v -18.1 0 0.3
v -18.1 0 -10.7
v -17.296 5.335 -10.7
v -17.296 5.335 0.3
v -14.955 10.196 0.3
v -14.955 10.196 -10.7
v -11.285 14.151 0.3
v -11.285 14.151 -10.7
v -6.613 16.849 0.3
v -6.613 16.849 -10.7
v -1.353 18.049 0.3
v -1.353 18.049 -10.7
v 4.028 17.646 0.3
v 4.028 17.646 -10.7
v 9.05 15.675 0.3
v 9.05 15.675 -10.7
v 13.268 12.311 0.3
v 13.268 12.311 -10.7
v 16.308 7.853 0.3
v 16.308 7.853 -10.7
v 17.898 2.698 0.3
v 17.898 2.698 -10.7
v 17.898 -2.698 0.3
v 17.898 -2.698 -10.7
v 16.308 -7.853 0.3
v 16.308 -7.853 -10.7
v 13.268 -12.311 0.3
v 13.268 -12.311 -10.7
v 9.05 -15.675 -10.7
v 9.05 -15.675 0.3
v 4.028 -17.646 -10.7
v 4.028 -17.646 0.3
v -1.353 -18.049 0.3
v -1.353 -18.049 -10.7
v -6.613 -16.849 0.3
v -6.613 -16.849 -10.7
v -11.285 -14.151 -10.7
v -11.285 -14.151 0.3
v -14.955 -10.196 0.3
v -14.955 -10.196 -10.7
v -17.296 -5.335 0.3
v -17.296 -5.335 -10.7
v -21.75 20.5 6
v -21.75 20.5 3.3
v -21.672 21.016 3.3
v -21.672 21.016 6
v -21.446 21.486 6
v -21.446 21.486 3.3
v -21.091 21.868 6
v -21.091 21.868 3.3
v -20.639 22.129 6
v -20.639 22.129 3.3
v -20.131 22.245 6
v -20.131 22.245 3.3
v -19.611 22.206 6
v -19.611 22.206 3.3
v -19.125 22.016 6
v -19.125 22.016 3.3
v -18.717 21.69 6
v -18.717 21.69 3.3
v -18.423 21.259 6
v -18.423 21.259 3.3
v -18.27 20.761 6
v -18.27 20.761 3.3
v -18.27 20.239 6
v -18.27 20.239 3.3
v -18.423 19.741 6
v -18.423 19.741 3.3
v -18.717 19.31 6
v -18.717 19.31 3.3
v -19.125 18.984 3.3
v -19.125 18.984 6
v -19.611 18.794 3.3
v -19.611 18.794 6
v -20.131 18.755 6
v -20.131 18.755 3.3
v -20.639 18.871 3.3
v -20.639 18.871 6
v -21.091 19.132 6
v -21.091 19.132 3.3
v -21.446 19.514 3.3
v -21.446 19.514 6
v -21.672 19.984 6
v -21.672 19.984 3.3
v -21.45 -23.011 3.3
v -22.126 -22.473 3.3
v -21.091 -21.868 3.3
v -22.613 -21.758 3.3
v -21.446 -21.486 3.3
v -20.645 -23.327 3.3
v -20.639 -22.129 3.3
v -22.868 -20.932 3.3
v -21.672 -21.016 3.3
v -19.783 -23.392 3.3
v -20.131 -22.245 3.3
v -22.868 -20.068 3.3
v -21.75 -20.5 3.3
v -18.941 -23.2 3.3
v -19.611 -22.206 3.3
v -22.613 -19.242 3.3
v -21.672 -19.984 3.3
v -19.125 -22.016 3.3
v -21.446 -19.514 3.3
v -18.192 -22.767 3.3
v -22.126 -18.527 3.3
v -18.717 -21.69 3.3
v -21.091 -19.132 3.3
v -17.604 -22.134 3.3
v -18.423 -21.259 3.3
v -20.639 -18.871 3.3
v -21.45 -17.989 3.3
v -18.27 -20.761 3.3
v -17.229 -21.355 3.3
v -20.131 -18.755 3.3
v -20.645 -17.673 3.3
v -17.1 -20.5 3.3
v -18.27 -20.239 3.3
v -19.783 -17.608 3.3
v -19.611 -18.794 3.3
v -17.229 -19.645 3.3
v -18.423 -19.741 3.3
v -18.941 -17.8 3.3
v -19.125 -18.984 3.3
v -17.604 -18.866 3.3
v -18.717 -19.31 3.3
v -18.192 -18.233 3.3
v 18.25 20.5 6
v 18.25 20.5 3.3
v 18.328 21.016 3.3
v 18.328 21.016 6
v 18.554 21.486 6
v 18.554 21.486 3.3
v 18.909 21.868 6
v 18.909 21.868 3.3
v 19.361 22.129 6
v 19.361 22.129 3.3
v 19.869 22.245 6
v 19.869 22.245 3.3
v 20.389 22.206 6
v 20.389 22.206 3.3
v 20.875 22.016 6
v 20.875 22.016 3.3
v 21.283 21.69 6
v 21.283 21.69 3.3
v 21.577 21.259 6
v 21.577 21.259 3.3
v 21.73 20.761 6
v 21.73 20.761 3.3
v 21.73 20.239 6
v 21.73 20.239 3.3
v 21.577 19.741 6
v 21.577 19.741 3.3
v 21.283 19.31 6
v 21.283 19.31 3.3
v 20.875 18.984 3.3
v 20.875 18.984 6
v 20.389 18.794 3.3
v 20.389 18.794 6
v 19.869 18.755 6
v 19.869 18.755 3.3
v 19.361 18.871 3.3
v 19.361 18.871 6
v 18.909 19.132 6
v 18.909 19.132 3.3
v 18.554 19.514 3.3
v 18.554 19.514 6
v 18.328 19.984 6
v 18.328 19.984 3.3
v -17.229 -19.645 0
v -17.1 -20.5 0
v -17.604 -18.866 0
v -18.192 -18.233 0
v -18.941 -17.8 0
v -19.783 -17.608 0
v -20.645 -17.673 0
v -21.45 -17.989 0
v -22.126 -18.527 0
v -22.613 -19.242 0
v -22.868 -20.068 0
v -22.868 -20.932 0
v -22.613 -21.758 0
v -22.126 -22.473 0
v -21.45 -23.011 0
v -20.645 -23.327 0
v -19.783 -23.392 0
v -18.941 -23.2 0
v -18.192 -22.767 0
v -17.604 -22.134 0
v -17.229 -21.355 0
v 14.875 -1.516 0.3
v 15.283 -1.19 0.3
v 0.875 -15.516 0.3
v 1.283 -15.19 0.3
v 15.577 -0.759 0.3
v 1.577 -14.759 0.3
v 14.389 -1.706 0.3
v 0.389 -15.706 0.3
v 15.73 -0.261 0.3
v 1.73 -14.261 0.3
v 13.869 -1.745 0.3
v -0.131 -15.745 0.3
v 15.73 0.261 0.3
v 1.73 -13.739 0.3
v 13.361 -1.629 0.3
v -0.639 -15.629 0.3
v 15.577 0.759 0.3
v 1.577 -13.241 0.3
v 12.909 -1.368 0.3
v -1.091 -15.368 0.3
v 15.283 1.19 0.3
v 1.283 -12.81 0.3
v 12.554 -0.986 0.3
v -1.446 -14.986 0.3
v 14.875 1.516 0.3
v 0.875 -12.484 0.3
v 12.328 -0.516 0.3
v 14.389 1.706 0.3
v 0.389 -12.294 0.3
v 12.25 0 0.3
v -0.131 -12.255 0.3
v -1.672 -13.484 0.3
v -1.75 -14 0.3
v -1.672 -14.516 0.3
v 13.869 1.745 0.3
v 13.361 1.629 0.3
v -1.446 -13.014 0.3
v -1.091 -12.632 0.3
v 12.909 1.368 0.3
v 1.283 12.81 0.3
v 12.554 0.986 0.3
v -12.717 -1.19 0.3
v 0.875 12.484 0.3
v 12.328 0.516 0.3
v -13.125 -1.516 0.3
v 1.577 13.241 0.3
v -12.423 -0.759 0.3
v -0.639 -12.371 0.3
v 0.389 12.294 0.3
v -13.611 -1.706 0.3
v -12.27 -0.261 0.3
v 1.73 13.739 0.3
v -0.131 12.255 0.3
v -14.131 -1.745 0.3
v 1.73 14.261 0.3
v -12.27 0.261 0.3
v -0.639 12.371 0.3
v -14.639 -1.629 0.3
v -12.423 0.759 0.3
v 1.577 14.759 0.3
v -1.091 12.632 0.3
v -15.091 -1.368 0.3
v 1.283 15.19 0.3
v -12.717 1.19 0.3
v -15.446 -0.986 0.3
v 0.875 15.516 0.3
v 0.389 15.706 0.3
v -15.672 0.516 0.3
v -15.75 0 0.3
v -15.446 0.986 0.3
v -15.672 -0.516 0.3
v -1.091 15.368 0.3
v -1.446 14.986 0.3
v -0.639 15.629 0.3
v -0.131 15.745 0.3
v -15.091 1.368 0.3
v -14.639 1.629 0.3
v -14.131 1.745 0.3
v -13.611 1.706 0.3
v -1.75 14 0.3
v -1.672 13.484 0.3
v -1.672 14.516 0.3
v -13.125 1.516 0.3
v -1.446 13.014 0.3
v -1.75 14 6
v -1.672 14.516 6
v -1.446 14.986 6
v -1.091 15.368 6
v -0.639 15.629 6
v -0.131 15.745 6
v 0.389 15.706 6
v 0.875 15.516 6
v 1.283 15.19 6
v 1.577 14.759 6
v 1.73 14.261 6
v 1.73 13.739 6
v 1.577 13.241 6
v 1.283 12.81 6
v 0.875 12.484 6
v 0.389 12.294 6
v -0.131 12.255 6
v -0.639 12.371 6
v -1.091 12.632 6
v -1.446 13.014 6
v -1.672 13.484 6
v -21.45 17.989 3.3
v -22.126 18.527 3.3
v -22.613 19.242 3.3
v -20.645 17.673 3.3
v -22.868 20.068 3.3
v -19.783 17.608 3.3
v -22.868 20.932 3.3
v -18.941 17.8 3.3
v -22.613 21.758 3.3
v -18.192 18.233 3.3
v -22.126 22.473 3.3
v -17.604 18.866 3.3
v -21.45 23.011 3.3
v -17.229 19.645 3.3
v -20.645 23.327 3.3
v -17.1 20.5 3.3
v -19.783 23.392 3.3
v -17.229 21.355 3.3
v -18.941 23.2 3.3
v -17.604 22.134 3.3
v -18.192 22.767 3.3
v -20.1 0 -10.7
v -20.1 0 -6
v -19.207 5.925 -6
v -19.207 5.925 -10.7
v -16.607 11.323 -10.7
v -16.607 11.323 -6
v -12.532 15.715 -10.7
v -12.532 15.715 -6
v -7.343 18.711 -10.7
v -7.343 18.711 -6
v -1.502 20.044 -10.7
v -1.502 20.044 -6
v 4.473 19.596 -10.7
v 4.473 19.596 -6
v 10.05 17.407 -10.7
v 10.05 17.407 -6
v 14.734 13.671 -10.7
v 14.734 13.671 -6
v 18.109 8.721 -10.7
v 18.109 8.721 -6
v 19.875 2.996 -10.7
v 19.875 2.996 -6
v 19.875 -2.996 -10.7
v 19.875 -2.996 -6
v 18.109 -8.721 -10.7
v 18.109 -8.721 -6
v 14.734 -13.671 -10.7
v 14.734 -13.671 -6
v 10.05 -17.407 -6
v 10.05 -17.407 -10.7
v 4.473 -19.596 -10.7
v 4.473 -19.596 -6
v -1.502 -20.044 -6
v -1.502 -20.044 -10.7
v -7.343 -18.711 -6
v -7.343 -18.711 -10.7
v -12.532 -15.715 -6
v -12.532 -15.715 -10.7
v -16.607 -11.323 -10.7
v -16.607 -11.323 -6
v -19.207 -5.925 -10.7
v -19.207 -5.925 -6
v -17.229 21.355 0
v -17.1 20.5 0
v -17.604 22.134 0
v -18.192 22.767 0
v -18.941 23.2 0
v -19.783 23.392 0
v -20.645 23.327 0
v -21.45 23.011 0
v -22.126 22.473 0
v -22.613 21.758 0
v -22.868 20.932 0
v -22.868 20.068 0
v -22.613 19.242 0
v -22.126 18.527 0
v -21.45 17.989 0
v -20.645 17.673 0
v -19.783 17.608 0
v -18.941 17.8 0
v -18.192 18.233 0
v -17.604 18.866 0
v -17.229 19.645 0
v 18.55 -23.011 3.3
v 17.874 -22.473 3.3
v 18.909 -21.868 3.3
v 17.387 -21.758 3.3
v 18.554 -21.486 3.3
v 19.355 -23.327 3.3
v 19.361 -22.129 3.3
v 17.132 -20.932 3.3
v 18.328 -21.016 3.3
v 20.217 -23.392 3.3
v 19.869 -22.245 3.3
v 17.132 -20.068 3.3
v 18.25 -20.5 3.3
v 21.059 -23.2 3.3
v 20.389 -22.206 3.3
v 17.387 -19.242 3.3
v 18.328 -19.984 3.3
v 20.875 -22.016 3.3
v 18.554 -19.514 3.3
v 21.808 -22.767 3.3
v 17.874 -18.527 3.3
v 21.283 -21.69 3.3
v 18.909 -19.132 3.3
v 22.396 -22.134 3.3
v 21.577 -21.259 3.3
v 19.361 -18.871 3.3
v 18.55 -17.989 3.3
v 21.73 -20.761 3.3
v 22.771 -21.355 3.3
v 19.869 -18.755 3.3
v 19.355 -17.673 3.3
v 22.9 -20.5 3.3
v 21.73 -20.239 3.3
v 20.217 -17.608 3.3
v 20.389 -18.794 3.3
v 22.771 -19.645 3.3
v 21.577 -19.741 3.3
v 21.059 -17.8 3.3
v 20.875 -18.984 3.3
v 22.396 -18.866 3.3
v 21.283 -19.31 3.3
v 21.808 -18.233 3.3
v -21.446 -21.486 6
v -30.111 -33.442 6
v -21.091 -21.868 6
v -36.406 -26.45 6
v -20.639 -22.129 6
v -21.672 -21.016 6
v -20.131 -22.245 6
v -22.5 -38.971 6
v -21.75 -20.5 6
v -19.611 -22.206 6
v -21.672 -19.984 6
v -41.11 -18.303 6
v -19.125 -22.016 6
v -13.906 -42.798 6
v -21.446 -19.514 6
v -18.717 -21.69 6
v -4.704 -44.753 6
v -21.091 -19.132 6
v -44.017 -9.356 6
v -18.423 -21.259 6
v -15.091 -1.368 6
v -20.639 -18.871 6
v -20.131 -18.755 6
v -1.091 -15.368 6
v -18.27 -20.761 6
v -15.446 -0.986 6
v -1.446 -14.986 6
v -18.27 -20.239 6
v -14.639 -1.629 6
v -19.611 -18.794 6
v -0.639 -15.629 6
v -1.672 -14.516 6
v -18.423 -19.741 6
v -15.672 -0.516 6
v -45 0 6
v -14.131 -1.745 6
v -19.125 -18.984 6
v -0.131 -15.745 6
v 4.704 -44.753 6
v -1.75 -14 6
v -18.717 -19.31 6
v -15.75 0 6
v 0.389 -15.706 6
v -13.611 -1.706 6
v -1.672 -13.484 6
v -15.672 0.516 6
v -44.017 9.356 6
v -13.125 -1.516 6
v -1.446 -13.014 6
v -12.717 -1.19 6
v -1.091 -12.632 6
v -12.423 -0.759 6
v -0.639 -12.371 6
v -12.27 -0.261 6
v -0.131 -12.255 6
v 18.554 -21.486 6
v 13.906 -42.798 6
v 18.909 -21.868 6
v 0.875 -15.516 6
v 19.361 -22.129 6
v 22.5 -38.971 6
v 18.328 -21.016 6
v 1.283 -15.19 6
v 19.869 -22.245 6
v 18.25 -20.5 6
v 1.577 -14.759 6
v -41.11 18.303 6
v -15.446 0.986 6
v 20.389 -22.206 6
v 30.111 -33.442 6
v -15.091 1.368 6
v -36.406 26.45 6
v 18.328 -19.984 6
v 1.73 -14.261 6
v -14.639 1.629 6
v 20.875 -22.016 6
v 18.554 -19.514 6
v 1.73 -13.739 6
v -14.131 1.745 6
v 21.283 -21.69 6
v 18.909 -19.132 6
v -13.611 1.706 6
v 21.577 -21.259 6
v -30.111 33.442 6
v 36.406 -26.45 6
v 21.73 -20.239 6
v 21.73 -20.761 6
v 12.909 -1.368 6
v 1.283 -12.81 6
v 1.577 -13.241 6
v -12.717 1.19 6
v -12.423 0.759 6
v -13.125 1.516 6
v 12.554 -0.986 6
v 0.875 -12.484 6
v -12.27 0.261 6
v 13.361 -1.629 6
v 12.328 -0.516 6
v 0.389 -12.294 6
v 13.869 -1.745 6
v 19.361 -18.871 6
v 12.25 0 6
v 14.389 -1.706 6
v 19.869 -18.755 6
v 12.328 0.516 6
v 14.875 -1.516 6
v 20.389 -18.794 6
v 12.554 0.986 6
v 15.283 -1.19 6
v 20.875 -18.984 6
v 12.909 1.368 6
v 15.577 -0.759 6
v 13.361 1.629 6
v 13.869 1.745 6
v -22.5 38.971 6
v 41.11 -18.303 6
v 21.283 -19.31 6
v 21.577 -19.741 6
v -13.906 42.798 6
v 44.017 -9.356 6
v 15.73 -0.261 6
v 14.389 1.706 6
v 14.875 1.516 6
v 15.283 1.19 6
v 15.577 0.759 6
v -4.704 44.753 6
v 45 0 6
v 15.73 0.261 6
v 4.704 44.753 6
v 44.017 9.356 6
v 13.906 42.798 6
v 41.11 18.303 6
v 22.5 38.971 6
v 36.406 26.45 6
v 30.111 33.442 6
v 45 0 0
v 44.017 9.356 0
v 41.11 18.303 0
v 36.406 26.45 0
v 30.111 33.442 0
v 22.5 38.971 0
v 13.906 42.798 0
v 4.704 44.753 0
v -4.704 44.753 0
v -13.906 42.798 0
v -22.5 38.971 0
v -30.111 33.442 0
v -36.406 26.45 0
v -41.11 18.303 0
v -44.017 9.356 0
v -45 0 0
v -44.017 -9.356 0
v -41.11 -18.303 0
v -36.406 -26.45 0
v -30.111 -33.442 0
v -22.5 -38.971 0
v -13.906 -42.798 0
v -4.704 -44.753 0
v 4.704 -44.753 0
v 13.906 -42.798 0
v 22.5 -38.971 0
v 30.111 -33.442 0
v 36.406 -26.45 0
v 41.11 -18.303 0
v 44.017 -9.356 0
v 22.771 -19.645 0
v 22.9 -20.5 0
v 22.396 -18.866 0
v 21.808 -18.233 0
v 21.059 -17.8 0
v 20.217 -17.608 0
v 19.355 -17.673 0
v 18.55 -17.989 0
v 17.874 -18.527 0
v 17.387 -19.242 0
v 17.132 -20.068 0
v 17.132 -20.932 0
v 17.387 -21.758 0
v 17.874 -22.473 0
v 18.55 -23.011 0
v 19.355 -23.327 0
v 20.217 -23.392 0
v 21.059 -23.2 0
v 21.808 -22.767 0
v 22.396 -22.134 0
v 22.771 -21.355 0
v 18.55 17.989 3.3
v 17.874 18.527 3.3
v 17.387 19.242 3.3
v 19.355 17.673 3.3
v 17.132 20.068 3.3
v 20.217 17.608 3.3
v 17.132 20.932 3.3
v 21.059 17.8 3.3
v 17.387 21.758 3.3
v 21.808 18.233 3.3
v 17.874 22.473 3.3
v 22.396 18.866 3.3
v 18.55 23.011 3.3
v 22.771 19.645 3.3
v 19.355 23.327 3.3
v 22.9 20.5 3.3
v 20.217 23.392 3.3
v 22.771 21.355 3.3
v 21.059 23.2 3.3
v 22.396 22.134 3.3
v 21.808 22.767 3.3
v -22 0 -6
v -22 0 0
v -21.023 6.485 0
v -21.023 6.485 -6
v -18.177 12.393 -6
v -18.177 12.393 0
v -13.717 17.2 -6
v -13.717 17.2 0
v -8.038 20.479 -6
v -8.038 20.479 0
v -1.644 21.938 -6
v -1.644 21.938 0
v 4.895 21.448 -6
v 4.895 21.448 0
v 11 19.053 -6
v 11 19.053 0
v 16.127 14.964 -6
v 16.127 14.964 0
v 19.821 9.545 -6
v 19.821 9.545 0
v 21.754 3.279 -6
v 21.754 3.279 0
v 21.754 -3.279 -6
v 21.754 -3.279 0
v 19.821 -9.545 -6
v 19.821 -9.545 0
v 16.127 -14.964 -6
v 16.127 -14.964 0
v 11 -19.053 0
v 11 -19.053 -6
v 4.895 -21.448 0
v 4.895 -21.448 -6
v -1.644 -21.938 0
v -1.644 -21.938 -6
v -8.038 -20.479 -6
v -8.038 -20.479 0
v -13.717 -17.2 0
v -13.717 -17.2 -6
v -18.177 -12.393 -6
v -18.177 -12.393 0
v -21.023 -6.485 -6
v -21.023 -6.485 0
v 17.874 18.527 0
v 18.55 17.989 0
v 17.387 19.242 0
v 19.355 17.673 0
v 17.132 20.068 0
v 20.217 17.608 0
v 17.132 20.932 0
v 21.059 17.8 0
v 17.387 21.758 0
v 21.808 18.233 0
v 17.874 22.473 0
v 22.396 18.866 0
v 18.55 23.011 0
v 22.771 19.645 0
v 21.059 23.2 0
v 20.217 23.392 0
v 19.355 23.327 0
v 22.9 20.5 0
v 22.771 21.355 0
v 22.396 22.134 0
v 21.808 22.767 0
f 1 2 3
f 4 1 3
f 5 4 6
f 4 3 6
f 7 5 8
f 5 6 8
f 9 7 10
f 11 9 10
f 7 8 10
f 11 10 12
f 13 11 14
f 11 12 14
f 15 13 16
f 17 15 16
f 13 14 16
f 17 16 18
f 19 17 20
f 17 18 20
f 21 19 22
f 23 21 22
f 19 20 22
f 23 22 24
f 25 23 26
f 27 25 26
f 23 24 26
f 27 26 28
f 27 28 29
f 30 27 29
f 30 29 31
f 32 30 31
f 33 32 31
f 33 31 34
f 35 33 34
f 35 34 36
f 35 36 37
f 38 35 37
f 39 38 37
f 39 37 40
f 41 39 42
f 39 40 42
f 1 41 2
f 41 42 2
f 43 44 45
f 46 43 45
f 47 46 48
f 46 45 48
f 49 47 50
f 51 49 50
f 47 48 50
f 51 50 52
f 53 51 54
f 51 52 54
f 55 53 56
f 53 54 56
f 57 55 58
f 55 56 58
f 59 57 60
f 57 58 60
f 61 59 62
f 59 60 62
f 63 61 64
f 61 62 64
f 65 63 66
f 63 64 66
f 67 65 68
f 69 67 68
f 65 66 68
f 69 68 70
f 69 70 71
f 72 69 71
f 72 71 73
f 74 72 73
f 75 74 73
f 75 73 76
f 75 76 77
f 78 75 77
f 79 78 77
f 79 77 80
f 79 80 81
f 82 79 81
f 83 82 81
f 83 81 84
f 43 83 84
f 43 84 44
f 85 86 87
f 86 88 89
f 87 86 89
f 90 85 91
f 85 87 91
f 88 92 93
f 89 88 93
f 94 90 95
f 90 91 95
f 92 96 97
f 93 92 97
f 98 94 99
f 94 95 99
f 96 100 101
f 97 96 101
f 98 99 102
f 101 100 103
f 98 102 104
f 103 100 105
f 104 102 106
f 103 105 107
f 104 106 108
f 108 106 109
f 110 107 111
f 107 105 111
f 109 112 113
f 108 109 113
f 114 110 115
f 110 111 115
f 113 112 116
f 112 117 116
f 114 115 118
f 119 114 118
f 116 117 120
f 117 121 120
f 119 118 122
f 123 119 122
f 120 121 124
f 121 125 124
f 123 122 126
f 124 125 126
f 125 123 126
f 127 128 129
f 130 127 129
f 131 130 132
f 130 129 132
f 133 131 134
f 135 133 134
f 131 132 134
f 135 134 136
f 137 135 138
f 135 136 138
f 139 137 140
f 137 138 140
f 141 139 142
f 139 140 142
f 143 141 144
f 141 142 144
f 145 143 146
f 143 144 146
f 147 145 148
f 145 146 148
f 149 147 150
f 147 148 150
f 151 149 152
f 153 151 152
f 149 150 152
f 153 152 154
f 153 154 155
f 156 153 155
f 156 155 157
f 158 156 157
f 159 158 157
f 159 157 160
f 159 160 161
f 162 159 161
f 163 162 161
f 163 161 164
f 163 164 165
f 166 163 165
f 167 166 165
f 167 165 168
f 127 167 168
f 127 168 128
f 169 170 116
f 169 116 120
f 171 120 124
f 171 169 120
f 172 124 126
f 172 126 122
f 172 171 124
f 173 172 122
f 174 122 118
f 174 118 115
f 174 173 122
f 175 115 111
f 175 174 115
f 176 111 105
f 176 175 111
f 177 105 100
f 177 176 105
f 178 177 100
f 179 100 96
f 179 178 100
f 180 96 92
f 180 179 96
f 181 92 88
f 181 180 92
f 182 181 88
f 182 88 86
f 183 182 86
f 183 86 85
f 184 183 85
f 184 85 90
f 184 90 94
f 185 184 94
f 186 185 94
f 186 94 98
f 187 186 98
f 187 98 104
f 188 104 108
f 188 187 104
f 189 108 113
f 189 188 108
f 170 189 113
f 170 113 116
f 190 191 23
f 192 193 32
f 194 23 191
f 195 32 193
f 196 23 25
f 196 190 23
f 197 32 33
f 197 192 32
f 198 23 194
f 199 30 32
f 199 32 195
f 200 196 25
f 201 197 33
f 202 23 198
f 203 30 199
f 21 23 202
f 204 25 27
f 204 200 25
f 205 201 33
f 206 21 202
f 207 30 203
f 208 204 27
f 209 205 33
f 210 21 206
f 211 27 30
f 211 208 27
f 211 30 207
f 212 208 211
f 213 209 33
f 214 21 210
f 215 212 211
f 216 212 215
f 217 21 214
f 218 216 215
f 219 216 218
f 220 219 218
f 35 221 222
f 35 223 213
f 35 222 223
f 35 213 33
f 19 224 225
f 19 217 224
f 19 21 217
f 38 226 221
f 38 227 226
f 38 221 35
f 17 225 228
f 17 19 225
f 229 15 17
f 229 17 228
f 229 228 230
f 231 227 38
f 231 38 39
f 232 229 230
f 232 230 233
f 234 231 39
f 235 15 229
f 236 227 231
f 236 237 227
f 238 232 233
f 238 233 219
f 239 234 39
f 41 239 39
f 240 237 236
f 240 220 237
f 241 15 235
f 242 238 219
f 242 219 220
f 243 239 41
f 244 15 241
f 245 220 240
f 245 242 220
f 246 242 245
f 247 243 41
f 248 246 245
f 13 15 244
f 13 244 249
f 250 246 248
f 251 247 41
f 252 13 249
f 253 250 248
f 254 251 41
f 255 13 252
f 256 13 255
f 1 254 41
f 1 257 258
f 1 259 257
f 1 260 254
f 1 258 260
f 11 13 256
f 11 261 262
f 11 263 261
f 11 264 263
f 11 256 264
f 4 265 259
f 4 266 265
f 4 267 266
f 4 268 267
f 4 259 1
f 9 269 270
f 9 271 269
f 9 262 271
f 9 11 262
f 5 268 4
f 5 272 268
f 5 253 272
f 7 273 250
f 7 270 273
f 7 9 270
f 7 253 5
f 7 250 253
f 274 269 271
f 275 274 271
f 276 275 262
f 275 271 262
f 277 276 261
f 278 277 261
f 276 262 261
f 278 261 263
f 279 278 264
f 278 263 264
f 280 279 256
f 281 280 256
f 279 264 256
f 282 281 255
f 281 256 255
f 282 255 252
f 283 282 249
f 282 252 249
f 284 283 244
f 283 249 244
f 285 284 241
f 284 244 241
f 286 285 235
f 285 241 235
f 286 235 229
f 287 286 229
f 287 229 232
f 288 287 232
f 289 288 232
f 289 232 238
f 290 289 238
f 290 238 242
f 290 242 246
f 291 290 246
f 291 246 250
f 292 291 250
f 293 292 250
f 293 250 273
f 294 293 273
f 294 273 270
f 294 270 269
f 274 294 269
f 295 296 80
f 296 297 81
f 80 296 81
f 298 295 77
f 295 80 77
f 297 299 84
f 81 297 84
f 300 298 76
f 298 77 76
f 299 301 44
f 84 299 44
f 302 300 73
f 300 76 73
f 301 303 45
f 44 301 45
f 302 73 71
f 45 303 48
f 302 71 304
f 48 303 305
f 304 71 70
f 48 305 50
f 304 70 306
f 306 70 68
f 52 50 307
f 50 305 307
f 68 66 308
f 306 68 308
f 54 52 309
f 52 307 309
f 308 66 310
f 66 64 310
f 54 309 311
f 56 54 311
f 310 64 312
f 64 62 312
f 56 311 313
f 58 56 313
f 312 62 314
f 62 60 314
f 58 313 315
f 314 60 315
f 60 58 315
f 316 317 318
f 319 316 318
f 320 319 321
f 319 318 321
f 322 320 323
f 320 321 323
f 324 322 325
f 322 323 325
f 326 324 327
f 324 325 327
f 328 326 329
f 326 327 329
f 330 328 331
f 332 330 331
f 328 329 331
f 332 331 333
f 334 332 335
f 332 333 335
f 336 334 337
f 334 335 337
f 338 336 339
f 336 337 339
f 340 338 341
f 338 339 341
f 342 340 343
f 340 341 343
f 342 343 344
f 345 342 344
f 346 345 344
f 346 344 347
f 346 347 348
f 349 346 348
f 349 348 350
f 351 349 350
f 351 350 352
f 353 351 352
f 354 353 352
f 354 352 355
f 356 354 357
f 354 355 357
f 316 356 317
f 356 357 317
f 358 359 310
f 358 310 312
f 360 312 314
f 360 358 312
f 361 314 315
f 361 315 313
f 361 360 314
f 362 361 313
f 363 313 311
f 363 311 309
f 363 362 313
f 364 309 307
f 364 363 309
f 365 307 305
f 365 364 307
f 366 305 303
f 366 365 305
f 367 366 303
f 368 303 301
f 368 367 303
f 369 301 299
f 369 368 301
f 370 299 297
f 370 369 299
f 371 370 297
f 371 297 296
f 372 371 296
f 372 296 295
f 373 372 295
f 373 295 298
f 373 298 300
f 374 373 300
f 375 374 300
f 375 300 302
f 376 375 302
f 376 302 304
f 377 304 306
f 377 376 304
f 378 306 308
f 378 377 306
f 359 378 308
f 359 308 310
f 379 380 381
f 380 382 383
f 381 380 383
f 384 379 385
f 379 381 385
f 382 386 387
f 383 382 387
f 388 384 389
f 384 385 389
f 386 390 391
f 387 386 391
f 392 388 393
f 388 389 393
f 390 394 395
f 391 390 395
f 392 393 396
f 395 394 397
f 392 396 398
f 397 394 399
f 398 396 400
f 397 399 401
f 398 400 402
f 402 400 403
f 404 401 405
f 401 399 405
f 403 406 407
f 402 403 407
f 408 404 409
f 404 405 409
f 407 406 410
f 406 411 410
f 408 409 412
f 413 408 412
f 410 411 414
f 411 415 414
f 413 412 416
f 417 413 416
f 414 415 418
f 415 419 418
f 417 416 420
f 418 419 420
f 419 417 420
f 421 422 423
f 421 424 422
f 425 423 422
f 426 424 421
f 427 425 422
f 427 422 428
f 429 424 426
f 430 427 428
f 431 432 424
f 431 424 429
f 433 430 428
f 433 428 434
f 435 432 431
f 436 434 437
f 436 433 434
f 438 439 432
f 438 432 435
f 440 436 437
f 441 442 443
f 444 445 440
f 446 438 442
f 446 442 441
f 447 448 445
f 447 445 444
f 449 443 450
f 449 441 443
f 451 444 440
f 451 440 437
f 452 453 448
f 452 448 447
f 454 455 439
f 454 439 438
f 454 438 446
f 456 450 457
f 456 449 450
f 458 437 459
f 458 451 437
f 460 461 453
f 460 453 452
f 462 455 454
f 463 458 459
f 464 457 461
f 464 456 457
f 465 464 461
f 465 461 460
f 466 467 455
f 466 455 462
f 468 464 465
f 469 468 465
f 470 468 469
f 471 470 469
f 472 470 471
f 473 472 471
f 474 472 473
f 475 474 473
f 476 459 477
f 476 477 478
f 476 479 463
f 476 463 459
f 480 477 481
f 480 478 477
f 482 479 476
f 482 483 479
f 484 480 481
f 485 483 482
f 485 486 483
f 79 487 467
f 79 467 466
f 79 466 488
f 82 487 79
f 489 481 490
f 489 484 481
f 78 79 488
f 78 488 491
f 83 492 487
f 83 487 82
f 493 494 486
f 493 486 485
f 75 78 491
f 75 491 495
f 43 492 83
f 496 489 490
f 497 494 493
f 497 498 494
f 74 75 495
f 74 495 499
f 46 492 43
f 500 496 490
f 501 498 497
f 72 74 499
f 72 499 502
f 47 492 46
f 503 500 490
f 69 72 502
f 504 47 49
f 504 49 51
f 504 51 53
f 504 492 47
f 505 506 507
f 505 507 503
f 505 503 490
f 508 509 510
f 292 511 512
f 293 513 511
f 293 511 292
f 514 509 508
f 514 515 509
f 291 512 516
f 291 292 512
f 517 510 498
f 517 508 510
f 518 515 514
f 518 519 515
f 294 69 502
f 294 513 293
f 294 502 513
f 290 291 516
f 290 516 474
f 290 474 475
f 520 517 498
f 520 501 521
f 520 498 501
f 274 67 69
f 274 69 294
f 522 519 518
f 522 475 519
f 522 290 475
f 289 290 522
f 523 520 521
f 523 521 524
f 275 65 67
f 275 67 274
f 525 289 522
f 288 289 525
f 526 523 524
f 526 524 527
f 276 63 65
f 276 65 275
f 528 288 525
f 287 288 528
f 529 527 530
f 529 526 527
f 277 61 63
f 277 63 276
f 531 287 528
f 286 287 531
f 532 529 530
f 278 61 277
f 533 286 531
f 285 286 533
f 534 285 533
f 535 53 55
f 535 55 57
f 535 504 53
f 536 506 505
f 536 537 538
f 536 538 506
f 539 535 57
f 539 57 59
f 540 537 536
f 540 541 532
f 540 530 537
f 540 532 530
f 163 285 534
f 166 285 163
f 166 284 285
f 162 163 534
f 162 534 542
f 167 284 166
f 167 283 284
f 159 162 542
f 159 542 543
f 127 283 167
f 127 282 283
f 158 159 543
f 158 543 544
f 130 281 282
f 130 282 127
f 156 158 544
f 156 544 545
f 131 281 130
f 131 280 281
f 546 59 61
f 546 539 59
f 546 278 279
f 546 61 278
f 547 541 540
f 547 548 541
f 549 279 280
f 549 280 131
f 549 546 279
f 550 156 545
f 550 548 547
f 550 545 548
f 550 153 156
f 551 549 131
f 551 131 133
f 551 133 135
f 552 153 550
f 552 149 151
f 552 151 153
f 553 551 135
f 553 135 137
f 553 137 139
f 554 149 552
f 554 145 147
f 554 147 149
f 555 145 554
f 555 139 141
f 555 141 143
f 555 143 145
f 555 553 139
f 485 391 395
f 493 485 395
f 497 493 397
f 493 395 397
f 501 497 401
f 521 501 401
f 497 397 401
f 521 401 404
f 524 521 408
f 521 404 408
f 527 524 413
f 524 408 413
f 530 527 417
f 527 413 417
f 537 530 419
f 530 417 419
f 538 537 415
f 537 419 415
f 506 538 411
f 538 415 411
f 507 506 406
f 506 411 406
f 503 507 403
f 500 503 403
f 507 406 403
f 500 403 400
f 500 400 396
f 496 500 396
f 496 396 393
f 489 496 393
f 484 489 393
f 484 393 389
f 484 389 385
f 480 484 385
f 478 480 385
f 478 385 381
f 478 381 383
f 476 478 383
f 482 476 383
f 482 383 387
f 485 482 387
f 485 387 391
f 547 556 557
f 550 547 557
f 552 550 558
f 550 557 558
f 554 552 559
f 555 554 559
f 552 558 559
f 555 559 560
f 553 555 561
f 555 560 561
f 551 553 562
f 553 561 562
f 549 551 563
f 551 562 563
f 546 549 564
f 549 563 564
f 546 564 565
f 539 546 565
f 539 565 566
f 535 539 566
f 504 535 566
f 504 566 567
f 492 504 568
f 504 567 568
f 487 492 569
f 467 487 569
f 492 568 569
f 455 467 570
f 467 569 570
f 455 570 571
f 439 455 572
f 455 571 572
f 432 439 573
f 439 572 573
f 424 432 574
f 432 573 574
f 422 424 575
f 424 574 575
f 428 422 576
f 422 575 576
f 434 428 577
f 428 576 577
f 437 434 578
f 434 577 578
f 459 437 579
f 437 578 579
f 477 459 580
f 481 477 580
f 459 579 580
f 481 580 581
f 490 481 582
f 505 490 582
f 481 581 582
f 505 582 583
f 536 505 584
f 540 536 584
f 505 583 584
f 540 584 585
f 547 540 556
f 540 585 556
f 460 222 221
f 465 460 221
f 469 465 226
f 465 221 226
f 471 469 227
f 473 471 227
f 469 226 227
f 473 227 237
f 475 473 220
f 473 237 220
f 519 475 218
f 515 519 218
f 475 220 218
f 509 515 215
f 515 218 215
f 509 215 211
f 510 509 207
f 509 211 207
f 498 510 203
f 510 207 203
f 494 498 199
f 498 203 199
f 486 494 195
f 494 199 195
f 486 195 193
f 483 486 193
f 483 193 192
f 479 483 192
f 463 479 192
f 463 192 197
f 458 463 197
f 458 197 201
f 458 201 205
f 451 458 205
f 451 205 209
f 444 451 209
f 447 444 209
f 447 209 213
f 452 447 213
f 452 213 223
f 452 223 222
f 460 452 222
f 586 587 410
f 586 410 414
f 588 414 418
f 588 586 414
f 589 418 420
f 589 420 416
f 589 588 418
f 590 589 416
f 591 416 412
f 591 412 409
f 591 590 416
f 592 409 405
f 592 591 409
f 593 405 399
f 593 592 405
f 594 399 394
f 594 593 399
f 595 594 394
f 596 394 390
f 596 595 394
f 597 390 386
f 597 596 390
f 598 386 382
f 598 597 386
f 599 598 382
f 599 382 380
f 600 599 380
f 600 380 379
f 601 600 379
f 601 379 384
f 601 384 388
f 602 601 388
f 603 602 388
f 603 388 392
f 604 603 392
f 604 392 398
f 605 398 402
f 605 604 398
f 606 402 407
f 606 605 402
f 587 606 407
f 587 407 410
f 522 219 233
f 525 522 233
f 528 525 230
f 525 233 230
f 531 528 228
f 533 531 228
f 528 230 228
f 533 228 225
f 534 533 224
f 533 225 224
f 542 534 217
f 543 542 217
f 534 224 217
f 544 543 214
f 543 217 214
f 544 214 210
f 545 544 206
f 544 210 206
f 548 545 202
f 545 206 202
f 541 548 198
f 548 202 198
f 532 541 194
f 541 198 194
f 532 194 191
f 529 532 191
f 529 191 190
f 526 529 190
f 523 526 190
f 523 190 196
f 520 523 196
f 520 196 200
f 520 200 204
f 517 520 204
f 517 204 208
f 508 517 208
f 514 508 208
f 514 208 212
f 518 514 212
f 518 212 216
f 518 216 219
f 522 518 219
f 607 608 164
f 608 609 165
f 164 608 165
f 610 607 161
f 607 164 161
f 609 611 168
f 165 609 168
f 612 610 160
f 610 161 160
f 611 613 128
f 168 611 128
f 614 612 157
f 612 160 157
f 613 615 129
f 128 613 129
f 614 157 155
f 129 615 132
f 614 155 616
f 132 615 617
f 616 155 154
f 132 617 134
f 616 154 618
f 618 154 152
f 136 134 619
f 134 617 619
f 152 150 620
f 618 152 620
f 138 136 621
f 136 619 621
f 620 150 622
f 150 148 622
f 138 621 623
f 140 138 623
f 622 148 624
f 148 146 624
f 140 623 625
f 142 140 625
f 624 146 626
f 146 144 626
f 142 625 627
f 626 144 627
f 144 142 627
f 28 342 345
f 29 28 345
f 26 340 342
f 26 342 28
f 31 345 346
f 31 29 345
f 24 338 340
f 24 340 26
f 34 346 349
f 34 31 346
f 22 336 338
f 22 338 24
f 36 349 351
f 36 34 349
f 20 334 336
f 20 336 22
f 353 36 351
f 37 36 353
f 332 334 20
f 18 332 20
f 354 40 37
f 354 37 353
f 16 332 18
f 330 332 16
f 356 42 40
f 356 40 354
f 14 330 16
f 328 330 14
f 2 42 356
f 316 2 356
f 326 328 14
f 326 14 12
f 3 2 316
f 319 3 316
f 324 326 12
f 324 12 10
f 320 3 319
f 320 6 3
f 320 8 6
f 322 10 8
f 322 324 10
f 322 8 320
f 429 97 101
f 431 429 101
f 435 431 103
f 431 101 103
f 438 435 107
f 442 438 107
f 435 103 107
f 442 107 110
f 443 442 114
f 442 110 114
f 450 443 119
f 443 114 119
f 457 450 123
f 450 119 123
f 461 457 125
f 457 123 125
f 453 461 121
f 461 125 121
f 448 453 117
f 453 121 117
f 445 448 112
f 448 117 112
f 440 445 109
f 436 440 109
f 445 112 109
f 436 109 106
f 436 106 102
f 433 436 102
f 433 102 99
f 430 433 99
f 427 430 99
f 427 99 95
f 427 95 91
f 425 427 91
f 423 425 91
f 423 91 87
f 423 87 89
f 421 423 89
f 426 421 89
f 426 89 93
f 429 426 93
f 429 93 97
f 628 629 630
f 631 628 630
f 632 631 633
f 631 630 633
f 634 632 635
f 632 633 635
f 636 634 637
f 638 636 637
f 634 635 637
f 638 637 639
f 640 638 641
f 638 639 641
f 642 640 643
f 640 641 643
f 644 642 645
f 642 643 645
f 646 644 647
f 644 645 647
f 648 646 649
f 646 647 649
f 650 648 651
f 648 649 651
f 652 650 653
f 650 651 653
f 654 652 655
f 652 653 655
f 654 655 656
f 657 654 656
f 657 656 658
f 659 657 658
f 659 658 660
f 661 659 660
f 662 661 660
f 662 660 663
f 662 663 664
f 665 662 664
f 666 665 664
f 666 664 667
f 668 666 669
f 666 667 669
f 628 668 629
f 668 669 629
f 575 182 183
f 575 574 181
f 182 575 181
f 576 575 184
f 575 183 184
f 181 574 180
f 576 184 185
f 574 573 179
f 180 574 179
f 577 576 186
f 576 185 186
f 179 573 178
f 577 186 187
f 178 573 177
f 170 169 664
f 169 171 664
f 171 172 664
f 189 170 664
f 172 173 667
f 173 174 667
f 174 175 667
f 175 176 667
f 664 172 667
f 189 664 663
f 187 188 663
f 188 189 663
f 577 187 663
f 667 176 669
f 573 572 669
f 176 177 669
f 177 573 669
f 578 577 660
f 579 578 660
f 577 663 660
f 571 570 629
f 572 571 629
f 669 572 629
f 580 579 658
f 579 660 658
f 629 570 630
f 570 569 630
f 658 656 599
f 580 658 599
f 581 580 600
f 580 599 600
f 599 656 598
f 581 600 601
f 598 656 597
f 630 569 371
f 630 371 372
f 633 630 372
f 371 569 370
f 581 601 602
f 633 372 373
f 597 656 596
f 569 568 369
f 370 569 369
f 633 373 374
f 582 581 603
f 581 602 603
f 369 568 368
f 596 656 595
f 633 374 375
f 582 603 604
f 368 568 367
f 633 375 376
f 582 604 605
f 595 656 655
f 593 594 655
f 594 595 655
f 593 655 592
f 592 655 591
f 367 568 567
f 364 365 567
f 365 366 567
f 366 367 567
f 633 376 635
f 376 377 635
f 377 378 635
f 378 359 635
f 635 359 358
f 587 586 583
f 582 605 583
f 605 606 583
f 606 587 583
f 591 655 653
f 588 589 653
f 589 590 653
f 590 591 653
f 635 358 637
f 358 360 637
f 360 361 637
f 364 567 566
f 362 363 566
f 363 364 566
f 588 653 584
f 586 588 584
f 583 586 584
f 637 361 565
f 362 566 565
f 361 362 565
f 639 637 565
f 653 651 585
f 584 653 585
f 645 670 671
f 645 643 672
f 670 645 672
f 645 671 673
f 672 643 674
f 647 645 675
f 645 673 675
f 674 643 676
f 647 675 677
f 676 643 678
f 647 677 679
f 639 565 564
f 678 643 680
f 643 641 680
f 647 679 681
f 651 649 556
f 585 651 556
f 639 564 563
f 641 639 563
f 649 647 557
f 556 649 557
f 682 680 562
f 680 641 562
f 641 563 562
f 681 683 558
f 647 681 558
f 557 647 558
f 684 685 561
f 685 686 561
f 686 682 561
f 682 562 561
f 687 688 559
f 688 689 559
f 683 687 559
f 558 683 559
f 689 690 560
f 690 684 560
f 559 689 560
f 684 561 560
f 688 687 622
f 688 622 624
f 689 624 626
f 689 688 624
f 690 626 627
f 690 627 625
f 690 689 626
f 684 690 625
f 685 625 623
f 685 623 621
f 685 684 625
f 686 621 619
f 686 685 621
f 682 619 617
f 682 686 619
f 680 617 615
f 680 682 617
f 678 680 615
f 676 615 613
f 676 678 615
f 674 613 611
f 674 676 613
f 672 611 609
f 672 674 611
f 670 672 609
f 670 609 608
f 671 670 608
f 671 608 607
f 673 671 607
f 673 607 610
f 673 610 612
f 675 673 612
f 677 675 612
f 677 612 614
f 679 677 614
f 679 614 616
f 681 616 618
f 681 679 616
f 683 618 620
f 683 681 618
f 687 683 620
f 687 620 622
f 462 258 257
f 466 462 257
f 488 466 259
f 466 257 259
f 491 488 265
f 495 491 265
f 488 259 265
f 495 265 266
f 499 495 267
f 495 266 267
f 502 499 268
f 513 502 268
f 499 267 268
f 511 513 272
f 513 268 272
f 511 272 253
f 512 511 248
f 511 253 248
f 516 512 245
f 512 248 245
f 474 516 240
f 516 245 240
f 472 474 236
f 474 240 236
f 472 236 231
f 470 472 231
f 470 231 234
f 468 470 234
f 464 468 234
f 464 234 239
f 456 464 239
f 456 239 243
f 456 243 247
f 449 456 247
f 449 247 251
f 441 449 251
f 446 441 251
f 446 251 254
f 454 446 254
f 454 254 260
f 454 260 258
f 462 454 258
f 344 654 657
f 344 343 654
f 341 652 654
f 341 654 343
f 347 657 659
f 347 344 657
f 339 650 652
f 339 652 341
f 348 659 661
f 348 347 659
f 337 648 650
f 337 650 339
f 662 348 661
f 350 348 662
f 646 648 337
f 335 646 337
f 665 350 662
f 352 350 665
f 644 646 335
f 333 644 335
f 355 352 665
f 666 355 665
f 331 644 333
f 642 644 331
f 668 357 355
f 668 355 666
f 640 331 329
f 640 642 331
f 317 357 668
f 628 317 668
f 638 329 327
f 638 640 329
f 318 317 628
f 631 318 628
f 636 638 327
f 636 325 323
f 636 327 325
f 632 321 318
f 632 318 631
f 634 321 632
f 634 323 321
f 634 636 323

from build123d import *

# Parameters (mm, degrees)
SKETCH1_R               = 45
BOSS_EXTRUDE1_DEPTH     = 6
SKETCH2_R               = 22
BOSS_EXTRUDE2_DEPTH     = 6
SKETCH3_R               = 20.1
BOSS_EXTRUDE3_DEPTH     = 4.7
SKETCH4_R               = 18.1
CUT_EXTRUDE1_DEPTH      = 11
SKETCH5_R               = 1.75
CUT_EXTRUDE2_DEPTH      = 6.7
SKETCH6_R               = 1.75
CUT_EXTRUDE3_DEPTH      = 12
CUT_EXTRUDE3_DEPTH_BACK = 6.7
SKETCH7_R               = 2.9
CUT_EXTRUDE5_DEPTH      = 3.3


with BuildPart() as part:
    # Sketch1 → Boss-Extrude1 (new body)
    with BuildSketch(Plane.XY):
        Circle(SKETCH1_R)
    extrude(amount=BOSS_EXTRUDE1_DEPTH)

    # Sketch2 → Boss-Extrude2 (add)
    with BuildSketch(Plane(origin=(0, 0, 0), x_dir=(-1, 0, 0), z_dir=(0, 0, -1))):
        Circle(SKETCH2_R)
    extrude(amount=BOSS_EXTRUDE2_DEPTH)

    # Sketch3 → Boss-Extrude3 (add)
    with BuildSketch(Plane(origin=(0, 0, -6), x_dir=(-1, 0, 0), z_dir=(0, 0, -1))):
        Circle(SKETCH3_R)
    extrude(amount=BOSS_EXTRUDE3_DEPTH)

    # Sketch4 → Cut-Extrude1 (cut)
    with BuildSketch(Plane(origin=(0, 0, -10.7), x_dir=(-1, 0, 0), z_dir=(0, 0, -1))):
        Circle(SKETCH4_R)
    extrude(amount=-CUT_EXTRUDE1_DEPTH, mode=Mode.SUBTRACT)

    # Sketch5 → Cut-Extrude2 (cut, through all)
    with BuildSketch(Plane(origin=(0, 0, 0.3), x_dir=(-1, 0, 0), z_dir=(0, 0, -1))):
        with Locations((14, 0)):
            Circle(SKETCH5_R)
        with Locations((0, -14)):
            Circle(SKETCH5_R)
        with Locations((-14, 0)):
            Circle(SKETCH5_R)
        with Locations((0, 14)):
            Circle(SKETCH5_R)
    extrude(amount=-CUT_EXTRUDE2_DEPTH, mode=Mode.SUBTRACT)

    # Sketch6 → Cut-Extrude3 (cut, two sides)
    with BuildSketch(Plane(origin=(0, 0, 0.3), x_dir=(-1, 0, 0), z_dir=(0, 0, -1))) as cut_extrude3_sk:
        with Locations((19.999991423, -20.5)):
            Circle(SKETCH6_R)
        with Locations((-19.999991423, 20.5)):
            Circle(SKETCH6_R)
        with Locations((-19.999991423, -20.5)):
            Circle(SKETCH6_R)
        with Locations((19.999991423, 20.5)):
            Circle(SKETCH6_R)
    extrude(amount=CUT_EXTRUDE3_DEPTH, mode=Mode.SUBTRACT)
    extrude(cut_extrude3_sk.sketch, amount=-CUT_EXTRUDE3_DEPTH_BACK, mode=Mode.SUBTRACT)

    # Sketch7 → Cut-Extrude5 (cut)
    with BuildSketch(Plane.XY):
        with Locations((19.999991423, 20.5)):
            Circle(SKETCH7_R)
        with Locations((-19.999991423, 20.5)):
            Circle(SKETCH7_R)
        with Locations((-19.999991423, -20.5)):
            Circle(SKETCH7_R)
        with Locations((19.999991423, -20.5)):
            Circle(SKETCH7_R)
    extrude(amount=CUT_EXTRUDE5_DEPTH, mode=Mode.SUBTRACT)


solid = part.part
